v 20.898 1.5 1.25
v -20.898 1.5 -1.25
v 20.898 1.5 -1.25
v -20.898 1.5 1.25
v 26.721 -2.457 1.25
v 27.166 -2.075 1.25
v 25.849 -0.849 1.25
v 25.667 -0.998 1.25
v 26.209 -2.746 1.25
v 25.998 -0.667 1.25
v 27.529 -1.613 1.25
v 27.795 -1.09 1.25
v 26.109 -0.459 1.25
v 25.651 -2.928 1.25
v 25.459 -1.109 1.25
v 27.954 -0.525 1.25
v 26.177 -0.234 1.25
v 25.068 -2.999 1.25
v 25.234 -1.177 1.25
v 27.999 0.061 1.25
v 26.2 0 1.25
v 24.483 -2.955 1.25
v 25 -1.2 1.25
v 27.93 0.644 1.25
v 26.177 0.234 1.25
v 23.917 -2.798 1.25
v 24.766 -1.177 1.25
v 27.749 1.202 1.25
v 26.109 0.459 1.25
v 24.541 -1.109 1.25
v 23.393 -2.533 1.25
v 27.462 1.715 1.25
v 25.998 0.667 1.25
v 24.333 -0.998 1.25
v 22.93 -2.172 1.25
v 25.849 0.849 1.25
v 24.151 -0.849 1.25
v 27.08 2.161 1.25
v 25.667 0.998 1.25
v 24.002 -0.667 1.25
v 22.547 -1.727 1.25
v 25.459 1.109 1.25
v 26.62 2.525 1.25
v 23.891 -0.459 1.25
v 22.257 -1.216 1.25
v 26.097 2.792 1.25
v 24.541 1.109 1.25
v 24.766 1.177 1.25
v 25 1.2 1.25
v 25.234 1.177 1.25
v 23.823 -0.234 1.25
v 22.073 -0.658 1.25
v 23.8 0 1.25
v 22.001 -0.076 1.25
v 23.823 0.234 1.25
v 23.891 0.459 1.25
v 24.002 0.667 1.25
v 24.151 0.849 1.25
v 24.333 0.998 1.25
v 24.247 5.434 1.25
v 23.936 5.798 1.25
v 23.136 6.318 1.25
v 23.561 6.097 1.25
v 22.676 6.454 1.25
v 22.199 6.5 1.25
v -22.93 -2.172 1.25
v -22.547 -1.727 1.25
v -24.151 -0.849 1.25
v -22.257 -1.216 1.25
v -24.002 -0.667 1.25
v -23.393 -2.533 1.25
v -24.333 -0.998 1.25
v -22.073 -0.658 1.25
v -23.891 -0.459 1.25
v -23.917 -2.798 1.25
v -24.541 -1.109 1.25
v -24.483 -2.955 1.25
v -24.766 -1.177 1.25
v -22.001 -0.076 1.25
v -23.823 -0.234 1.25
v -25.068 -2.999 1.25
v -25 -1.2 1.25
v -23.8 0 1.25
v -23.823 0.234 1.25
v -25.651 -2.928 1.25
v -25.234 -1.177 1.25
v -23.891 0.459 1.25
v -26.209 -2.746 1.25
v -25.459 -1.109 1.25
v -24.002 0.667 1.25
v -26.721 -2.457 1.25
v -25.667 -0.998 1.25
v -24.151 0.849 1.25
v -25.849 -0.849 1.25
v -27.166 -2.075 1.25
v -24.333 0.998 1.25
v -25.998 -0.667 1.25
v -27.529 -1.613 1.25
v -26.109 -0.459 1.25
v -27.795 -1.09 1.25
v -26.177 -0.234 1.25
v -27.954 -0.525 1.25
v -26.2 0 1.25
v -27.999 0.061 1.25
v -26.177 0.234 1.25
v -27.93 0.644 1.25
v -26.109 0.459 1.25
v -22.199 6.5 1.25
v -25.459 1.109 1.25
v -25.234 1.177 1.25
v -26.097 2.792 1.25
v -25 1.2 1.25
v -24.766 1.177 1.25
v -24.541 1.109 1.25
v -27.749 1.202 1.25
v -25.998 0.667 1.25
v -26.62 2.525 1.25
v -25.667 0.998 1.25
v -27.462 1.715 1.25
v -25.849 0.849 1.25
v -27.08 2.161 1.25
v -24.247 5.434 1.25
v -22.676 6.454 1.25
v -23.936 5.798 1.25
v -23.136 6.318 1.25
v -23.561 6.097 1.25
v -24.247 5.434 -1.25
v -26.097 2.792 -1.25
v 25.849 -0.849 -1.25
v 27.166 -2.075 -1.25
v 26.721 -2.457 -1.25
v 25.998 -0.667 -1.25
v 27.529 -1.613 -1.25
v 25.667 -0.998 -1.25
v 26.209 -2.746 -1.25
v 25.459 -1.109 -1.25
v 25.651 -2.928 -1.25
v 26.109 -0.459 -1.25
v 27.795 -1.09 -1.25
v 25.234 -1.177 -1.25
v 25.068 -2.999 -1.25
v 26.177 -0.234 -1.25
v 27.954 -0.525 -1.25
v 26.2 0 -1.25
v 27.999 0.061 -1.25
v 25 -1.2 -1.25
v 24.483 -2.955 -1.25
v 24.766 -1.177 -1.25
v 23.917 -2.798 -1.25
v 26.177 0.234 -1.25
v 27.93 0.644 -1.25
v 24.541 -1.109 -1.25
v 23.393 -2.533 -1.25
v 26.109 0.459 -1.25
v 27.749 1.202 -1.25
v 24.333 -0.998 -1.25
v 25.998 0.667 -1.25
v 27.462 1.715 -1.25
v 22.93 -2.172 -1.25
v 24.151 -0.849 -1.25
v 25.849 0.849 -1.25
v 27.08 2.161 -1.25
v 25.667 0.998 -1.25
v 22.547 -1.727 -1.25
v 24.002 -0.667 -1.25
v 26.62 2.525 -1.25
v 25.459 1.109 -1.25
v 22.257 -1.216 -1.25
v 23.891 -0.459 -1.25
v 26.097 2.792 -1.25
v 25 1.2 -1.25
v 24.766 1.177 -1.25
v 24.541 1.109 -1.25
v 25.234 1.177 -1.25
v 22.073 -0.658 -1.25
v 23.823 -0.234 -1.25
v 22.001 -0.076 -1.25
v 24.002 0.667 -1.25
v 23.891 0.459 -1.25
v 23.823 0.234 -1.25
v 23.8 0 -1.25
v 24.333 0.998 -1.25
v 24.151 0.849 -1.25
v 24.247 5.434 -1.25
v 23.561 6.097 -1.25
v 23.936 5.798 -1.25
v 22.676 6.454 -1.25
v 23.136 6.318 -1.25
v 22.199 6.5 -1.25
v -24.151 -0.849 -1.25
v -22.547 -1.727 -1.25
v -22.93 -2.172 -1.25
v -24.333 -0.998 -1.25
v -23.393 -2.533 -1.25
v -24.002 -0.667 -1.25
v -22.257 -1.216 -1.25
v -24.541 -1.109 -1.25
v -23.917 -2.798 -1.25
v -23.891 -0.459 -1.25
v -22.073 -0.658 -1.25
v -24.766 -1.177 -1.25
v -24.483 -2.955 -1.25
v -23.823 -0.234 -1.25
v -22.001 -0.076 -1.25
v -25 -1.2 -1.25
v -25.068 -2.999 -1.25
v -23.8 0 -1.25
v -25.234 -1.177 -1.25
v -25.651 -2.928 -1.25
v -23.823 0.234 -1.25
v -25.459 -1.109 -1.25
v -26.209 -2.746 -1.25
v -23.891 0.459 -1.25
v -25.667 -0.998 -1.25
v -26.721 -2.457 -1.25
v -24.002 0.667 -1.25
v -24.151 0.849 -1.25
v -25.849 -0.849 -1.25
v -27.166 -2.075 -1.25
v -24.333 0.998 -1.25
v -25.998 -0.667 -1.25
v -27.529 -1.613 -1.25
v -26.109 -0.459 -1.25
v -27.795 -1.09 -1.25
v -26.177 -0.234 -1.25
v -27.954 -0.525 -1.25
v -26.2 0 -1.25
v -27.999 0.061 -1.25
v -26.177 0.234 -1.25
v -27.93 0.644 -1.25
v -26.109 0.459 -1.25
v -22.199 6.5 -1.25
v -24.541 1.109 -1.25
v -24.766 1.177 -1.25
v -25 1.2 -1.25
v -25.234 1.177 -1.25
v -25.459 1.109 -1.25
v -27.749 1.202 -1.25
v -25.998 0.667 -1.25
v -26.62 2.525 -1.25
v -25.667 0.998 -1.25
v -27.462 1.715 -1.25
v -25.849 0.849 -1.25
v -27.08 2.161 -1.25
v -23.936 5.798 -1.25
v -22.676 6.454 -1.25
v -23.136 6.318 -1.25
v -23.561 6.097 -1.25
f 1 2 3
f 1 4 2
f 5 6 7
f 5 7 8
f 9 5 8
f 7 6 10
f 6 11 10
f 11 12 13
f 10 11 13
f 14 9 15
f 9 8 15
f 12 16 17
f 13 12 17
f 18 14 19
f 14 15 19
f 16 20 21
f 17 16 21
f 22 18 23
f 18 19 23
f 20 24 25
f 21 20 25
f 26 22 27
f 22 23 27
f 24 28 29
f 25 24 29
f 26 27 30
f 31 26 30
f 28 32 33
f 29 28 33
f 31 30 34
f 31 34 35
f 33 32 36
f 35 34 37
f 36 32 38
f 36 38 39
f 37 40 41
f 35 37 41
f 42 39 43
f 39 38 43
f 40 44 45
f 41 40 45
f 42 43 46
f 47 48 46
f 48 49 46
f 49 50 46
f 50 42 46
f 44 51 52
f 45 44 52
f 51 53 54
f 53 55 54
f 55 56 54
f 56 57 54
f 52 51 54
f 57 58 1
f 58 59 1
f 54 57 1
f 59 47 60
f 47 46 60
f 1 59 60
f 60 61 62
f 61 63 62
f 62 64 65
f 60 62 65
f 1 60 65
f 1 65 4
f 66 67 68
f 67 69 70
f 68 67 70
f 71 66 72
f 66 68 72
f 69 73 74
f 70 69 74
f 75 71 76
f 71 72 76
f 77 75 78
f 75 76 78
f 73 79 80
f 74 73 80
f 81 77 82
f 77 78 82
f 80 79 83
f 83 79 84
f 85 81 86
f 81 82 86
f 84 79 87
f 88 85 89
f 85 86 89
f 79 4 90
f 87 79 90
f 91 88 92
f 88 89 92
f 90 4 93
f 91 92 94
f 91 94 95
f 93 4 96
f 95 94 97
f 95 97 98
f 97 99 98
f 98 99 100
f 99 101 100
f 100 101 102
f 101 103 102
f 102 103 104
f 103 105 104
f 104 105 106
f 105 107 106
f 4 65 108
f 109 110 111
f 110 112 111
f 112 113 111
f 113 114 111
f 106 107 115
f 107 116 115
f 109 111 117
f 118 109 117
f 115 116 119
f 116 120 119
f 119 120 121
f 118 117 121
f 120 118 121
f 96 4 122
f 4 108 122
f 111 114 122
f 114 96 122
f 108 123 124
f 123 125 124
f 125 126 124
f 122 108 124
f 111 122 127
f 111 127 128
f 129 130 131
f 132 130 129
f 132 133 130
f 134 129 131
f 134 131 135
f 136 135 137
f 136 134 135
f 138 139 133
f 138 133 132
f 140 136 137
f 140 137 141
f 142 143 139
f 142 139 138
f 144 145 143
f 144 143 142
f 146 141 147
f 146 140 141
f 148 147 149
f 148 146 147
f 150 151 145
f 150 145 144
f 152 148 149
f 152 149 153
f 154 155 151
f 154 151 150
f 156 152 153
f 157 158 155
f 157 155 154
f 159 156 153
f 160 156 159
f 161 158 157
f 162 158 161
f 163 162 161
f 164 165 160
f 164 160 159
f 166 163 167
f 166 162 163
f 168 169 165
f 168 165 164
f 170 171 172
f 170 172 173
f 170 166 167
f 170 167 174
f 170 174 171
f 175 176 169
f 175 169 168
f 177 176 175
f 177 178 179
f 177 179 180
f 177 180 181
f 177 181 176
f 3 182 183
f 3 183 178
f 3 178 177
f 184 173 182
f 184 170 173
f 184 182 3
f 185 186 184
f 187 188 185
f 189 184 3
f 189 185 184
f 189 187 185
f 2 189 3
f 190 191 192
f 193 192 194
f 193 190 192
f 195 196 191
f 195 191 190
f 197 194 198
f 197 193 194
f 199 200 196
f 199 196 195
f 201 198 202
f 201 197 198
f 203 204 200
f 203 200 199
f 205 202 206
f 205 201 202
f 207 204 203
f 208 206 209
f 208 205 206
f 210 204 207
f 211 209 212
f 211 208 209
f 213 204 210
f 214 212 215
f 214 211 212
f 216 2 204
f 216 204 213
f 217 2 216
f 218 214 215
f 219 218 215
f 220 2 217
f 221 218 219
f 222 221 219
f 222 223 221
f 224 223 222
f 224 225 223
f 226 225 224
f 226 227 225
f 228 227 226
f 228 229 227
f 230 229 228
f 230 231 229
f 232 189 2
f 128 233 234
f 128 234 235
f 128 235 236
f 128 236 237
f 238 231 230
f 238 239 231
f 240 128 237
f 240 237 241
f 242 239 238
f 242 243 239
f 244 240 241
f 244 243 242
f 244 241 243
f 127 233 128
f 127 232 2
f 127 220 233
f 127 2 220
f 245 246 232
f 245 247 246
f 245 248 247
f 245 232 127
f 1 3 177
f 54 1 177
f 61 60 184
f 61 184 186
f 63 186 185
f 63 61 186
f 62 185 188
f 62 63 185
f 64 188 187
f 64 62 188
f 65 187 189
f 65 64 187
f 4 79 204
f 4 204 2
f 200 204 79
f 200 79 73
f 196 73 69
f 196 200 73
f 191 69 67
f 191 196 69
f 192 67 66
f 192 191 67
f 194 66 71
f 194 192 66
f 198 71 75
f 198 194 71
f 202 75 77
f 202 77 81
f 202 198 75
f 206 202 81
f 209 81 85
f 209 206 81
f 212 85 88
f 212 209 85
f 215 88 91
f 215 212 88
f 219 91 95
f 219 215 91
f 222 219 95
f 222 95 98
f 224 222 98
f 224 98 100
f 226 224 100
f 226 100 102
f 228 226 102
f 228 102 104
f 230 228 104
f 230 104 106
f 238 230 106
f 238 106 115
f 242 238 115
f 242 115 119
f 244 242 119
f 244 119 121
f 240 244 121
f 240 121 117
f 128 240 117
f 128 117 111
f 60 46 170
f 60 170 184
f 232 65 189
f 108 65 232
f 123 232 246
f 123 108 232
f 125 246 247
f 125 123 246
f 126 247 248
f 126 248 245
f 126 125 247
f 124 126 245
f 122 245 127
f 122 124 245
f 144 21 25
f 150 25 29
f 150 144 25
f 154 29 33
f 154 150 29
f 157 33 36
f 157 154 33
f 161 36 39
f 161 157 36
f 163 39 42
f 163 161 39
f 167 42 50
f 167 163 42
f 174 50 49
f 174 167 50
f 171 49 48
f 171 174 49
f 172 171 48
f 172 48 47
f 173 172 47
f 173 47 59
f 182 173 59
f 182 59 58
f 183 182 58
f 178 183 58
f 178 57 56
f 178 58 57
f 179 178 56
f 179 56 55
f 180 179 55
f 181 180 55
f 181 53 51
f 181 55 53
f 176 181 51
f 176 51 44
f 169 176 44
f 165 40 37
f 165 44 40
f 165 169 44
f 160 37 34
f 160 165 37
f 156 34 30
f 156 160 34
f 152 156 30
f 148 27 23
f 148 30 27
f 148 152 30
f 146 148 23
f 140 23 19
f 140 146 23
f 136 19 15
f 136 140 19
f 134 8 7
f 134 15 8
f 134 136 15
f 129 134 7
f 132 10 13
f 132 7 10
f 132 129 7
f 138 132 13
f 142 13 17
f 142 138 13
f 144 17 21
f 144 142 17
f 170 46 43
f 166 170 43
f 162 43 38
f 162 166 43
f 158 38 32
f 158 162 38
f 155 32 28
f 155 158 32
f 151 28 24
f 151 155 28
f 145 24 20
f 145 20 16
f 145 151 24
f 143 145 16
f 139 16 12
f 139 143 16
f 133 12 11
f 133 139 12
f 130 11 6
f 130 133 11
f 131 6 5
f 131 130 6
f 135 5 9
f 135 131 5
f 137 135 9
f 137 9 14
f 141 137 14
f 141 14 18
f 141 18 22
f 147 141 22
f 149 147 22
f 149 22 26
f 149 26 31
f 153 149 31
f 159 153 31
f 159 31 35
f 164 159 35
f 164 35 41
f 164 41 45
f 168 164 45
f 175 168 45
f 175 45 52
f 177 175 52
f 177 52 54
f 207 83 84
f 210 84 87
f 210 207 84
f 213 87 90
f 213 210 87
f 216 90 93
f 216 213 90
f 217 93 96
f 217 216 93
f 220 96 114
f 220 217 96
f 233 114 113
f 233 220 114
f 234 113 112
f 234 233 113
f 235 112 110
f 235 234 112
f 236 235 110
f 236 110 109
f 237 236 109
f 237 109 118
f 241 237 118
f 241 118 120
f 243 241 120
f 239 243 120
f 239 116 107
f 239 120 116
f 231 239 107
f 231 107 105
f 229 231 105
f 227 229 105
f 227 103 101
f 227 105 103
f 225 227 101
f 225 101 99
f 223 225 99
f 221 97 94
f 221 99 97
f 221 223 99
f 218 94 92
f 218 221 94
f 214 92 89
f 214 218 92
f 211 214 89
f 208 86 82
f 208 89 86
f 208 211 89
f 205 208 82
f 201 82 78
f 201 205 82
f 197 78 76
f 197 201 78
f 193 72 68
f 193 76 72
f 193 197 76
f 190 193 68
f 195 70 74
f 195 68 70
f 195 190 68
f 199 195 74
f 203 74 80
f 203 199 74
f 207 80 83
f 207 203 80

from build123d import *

# Parameters (mm, degrees)
SKETCH1_R           = 1.2
BOSS_EXTRUDE1_DEPTH = 1.25
SKETCH2_R           = 3
SKETCH2_R_2         = 1.2
BOSS_EXTRUDE2_DEPTH = 2.5


with BuildPart() as part:
    # Sketch1 → Boss-Extrude1 (new body, symmetric)
    with BuildSketch(Plane.XY):
        with BuildLine():
            Line((-20.897752221, 1.5), (20.897752221, 1.5))
            Line((20.897752221, 1.5), (22.952119889, -1.433941091))
            ThreePointArc((22.952119889, -1.433941091), (26.433941091, -2.047880111), (27.047880111, 1.433941091))
            Line((27.047880111, 1.433941091), (24.247049958, 5.433941091))
            ThreePointArc((24.247049958, 5.433941091), (23.35354138, 6.217527083), (22.199169847, 6.5))
            Line((22.199169847, 6.5), (-22.199169847, 6.5))
            ThreePointArc((-22.199169847, 6.5), (-23.35354138, 6.217527083), (-24.247049958, 5.433941091))
            Line((-24.247049958, 5.433941091), (-27.047880111, 1.433941091))
            ThreePointArc((-27.047880111, 1.433941091), (-26.433941091, -2.047880111), (-22.952119889, -1.433941091))
            Line((-22.952119889, -1.433941091), (-20.897752221, 1.5))
        make_face()
        with Locations((-25, 0)):
            Circle(SKETCH1_R, mode=Mode.SUBTRACT)
        with Locations((25, 0)):
            Circle(SKETCH1_R, mode=Mode.SUBTRACT)
    extrude(amount=BOSS_EXTRUDE1_DEPTH, both=True)

    # Sketch2 → Boss-Extrude2 (add)
    with BuildSketch(Plane(origin=(0, 0, -1.25), x_dir=(-1, 0, 0), z_dir=(0, 0, -1))):
        with Locations((25, 0)):
            Circle(SKETCH2_R)
        with Locations((25, 0)):
            Circle(SKETCH2_R_2, mode=Mode.SUBTRACT)
        with Locations((-25, 0)):
            Circle(SKETCH2_R)
        with Locations((-25, 0)):
            Circle(SKETCH2_R_2, mode=Mode.SUBTRACT)
    extrude(amount=-BOSS_EXTRUDE2_DEPTH)


solid = part.part
